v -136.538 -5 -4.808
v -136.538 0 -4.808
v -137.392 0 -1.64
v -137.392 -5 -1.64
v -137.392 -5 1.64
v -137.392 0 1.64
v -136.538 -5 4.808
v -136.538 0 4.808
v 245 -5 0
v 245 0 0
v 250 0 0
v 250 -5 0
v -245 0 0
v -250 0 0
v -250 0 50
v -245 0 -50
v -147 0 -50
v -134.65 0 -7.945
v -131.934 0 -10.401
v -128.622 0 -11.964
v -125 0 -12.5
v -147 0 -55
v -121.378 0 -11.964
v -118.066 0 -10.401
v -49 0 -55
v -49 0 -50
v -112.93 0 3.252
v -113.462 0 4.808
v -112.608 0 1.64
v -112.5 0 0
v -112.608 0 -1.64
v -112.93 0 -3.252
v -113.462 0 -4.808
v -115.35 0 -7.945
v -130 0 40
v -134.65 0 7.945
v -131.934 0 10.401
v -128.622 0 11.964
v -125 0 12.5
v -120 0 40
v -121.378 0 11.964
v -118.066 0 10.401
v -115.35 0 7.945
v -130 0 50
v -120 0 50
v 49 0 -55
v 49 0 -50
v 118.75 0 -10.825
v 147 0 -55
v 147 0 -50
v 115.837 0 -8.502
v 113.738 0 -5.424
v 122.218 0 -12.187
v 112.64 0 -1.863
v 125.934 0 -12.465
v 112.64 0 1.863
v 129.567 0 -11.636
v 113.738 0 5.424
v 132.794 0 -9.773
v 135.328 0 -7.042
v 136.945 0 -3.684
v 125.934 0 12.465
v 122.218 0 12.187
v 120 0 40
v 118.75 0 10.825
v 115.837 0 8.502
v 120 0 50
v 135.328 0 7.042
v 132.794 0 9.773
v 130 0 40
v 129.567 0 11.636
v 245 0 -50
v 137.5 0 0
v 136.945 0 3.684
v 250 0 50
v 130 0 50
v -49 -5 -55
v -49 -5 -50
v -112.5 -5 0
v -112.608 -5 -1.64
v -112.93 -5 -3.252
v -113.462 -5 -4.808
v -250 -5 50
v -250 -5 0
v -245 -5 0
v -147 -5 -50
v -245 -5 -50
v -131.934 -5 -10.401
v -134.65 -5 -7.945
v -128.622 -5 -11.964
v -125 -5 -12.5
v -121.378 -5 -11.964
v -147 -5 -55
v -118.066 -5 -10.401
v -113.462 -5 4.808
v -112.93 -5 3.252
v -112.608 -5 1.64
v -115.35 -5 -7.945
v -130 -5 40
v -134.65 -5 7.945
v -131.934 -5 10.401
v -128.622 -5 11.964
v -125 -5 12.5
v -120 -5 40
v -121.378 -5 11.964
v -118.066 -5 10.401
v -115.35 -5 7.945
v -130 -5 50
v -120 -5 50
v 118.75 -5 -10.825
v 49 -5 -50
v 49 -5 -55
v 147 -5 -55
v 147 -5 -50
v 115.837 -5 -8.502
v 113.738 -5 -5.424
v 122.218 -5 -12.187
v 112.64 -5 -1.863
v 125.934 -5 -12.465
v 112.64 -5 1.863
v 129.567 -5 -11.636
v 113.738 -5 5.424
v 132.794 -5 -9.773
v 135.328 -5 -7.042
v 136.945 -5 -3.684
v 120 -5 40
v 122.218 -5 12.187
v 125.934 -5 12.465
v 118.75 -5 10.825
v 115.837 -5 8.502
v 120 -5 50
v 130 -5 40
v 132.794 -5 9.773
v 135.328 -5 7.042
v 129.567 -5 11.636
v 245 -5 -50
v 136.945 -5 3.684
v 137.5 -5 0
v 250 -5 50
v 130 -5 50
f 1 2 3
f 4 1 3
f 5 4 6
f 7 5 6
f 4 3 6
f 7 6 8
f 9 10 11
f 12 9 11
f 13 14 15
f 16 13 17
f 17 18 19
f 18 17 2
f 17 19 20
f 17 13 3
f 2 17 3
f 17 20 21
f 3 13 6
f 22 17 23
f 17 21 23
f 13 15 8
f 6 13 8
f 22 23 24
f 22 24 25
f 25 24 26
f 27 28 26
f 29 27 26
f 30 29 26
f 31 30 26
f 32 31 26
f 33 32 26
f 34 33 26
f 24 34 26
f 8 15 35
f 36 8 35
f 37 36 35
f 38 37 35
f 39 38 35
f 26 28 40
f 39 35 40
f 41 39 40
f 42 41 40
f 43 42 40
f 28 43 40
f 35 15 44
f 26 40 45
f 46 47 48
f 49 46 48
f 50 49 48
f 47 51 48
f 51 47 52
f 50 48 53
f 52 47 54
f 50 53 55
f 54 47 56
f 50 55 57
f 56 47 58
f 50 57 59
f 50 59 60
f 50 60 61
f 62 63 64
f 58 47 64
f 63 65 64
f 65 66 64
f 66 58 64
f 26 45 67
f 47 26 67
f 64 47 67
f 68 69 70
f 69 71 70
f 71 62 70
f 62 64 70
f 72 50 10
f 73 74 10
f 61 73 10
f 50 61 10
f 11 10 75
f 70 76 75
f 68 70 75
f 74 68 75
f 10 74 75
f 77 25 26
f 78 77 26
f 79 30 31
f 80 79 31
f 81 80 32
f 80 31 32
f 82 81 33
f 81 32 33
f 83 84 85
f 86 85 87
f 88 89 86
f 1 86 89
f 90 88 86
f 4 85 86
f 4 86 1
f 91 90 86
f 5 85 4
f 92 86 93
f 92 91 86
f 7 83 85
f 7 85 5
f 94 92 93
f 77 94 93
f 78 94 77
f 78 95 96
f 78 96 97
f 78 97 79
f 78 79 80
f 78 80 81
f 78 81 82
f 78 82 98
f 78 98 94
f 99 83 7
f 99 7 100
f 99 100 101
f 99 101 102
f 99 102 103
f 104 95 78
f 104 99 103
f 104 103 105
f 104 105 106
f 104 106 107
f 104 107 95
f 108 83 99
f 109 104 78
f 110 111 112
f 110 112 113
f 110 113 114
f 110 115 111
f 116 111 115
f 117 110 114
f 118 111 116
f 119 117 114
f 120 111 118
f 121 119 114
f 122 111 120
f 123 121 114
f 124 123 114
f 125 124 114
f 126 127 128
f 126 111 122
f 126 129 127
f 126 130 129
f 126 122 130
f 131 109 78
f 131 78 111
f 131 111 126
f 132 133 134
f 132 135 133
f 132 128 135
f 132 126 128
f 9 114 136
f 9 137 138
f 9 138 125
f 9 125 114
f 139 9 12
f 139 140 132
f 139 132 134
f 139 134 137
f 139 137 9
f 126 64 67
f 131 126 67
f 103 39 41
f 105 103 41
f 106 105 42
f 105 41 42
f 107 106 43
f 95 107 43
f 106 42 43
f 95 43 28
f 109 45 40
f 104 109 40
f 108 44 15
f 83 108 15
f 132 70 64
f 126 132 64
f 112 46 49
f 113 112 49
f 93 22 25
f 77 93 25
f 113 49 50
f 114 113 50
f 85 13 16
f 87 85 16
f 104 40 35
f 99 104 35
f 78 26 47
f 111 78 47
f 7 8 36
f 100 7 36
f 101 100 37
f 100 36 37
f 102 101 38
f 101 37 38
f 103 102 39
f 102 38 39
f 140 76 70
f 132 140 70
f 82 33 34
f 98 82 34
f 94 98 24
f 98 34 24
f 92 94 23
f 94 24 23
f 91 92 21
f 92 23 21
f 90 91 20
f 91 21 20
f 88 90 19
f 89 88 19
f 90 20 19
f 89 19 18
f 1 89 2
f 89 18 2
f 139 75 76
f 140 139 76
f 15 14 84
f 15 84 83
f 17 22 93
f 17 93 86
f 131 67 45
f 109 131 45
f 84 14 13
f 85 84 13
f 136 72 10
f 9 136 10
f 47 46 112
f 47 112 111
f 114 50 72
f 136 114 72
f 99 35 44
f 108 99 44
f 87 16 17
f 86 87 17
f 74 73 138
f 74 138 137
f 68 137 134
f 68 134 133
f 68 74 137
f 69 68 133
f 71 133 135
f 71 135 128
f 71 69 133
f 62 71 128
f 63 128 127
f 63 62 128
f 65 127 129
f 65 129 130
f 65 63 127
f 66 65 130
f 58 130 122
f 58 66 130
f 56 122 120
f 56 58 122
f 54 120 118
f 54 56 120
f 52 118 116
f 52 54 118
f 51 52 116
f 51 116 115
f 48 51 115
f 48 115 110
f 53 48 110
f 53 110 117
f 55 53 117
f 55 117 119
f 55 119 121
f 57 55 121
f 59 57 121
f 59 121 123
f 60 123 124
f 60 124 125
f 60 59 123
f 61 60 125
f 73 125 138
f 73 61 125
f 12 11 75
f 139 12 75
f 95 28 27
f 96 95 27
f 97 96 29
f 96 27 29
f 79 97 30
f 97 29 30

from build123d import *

# Parameters (mm, degrees)
F0_R     = 12.5
F0_W     = 98
F0_H     = 5
F0_W_2   = 5
F0_H_2   = 50
F0_H_3   = 100
F1_DEPTH = 5


with BuildPart() as f1:
    # F0 (on Front) → F1 (new body)
    with BuildSketch(Plane.XZ):
        Polygon((147, -50), (245, -50), (245, 0), (245, 50), (130, 50), (130, 40), (125, 40), (120, 40), (120, 50), (5, 50), (5, -50), (49, -50), align=None)
        with Locations((125, 0)):
            Circle(F0_R, mode=Mode.SUBTRACT)
        with Locations((98, -52.5)):
            Rectangle(F0_W, F0_H)
        with Locations((247.5, 25)):
            Rectangle(F0_W_2, F0_H_2)
        with Locations((2.5, 0)):
            Rectangle(F0_W_2, F0_H_3)
        with Locations((-2.5, 0)):
            Rectangle(F0_W_2, F0_H_3)
        with BuildLine():
            Line((-113.4615384615, -4.8076923077), (-5, -50))
            Line((-5, -50), (-5, 50))
            Line((-5, 50), (-113.4615384615, 4.8076923077))
            ThreePointArc((-113.4615384615, 4.8076923077), (-112.7427415539, 2.4514516892), (-112.5, 0))
            ThreePointArc((-112.5, 0), (-112.7427415539, -2.4514516892), (-113.4615384615, -4.8076923077))
        make_face()
        with BuildLine():
            Line((-49, -50), (-5, -50))
            Line((-5, -50), (-113.4615384615, -4.8076923077))
            ThreePointArc((-113.4615384615, -4.8076923077), (-125, -12.5), (-136.5384615385, -4.8076923077))
            Line((-136.5384615385, -4.8076923077), (-245, -50))
            Line((-245, -50), (-147, -50))
            Line((-147, -50), (-49, -50))
        make_face()
        with Locations((-98, -52.5)):
            Rectangle(F0_W, F0_H)
        with BuildLine():
            Line((-113.4615384615, 4.8076923077), (-5, 50))
            Line((-5, 50), (-120, 50))
            Line((-120, 50), (-120, 40))
            Line((-120, 40), (-125, 40))
            Line((-125, 40), (-125, 12.5))
            ThreePointArc((-125, 12.5), (-118.0662475472, 10.4006286792), (-113.4615384615, 4.8076923077))
        make_face()
        with BuildLine():
            Line((-245, -50), (-136.5384615385, -4.8076923077))
            ThreePointArc((-136.5384615385, -4.8076923077), (-137.5, 0), (-136.5384615385, 4.8076923077))
            Line((-136.5384615385, 4.8076923077), (-245, 50))
            Line((-245, 50), (-245, 0))
            Line((-245, 0), (-245, -50))
        make_face()
        with BuildLine():
            ThreePointArc((-136.5384615385, 4.8076923077), (-131.9337524528, 10.4006286792), (-125, 12.5))
            Line((-125, 12.5), (-125, 40))
            Line((-125, 40), (-130, 40))
            Line((-130, 40), (-130, 50))
            Line((-130, 50), (-245, 50))
            Line((-245, 50), (-136.5384615385, 4.8076923077))
        make_face()
        with Locations((-247.5, 25)):
            Rectangle(F0_W_2, F0_H_2)
    extrude(amount=F1_DEPTH)


solid = f1.part
